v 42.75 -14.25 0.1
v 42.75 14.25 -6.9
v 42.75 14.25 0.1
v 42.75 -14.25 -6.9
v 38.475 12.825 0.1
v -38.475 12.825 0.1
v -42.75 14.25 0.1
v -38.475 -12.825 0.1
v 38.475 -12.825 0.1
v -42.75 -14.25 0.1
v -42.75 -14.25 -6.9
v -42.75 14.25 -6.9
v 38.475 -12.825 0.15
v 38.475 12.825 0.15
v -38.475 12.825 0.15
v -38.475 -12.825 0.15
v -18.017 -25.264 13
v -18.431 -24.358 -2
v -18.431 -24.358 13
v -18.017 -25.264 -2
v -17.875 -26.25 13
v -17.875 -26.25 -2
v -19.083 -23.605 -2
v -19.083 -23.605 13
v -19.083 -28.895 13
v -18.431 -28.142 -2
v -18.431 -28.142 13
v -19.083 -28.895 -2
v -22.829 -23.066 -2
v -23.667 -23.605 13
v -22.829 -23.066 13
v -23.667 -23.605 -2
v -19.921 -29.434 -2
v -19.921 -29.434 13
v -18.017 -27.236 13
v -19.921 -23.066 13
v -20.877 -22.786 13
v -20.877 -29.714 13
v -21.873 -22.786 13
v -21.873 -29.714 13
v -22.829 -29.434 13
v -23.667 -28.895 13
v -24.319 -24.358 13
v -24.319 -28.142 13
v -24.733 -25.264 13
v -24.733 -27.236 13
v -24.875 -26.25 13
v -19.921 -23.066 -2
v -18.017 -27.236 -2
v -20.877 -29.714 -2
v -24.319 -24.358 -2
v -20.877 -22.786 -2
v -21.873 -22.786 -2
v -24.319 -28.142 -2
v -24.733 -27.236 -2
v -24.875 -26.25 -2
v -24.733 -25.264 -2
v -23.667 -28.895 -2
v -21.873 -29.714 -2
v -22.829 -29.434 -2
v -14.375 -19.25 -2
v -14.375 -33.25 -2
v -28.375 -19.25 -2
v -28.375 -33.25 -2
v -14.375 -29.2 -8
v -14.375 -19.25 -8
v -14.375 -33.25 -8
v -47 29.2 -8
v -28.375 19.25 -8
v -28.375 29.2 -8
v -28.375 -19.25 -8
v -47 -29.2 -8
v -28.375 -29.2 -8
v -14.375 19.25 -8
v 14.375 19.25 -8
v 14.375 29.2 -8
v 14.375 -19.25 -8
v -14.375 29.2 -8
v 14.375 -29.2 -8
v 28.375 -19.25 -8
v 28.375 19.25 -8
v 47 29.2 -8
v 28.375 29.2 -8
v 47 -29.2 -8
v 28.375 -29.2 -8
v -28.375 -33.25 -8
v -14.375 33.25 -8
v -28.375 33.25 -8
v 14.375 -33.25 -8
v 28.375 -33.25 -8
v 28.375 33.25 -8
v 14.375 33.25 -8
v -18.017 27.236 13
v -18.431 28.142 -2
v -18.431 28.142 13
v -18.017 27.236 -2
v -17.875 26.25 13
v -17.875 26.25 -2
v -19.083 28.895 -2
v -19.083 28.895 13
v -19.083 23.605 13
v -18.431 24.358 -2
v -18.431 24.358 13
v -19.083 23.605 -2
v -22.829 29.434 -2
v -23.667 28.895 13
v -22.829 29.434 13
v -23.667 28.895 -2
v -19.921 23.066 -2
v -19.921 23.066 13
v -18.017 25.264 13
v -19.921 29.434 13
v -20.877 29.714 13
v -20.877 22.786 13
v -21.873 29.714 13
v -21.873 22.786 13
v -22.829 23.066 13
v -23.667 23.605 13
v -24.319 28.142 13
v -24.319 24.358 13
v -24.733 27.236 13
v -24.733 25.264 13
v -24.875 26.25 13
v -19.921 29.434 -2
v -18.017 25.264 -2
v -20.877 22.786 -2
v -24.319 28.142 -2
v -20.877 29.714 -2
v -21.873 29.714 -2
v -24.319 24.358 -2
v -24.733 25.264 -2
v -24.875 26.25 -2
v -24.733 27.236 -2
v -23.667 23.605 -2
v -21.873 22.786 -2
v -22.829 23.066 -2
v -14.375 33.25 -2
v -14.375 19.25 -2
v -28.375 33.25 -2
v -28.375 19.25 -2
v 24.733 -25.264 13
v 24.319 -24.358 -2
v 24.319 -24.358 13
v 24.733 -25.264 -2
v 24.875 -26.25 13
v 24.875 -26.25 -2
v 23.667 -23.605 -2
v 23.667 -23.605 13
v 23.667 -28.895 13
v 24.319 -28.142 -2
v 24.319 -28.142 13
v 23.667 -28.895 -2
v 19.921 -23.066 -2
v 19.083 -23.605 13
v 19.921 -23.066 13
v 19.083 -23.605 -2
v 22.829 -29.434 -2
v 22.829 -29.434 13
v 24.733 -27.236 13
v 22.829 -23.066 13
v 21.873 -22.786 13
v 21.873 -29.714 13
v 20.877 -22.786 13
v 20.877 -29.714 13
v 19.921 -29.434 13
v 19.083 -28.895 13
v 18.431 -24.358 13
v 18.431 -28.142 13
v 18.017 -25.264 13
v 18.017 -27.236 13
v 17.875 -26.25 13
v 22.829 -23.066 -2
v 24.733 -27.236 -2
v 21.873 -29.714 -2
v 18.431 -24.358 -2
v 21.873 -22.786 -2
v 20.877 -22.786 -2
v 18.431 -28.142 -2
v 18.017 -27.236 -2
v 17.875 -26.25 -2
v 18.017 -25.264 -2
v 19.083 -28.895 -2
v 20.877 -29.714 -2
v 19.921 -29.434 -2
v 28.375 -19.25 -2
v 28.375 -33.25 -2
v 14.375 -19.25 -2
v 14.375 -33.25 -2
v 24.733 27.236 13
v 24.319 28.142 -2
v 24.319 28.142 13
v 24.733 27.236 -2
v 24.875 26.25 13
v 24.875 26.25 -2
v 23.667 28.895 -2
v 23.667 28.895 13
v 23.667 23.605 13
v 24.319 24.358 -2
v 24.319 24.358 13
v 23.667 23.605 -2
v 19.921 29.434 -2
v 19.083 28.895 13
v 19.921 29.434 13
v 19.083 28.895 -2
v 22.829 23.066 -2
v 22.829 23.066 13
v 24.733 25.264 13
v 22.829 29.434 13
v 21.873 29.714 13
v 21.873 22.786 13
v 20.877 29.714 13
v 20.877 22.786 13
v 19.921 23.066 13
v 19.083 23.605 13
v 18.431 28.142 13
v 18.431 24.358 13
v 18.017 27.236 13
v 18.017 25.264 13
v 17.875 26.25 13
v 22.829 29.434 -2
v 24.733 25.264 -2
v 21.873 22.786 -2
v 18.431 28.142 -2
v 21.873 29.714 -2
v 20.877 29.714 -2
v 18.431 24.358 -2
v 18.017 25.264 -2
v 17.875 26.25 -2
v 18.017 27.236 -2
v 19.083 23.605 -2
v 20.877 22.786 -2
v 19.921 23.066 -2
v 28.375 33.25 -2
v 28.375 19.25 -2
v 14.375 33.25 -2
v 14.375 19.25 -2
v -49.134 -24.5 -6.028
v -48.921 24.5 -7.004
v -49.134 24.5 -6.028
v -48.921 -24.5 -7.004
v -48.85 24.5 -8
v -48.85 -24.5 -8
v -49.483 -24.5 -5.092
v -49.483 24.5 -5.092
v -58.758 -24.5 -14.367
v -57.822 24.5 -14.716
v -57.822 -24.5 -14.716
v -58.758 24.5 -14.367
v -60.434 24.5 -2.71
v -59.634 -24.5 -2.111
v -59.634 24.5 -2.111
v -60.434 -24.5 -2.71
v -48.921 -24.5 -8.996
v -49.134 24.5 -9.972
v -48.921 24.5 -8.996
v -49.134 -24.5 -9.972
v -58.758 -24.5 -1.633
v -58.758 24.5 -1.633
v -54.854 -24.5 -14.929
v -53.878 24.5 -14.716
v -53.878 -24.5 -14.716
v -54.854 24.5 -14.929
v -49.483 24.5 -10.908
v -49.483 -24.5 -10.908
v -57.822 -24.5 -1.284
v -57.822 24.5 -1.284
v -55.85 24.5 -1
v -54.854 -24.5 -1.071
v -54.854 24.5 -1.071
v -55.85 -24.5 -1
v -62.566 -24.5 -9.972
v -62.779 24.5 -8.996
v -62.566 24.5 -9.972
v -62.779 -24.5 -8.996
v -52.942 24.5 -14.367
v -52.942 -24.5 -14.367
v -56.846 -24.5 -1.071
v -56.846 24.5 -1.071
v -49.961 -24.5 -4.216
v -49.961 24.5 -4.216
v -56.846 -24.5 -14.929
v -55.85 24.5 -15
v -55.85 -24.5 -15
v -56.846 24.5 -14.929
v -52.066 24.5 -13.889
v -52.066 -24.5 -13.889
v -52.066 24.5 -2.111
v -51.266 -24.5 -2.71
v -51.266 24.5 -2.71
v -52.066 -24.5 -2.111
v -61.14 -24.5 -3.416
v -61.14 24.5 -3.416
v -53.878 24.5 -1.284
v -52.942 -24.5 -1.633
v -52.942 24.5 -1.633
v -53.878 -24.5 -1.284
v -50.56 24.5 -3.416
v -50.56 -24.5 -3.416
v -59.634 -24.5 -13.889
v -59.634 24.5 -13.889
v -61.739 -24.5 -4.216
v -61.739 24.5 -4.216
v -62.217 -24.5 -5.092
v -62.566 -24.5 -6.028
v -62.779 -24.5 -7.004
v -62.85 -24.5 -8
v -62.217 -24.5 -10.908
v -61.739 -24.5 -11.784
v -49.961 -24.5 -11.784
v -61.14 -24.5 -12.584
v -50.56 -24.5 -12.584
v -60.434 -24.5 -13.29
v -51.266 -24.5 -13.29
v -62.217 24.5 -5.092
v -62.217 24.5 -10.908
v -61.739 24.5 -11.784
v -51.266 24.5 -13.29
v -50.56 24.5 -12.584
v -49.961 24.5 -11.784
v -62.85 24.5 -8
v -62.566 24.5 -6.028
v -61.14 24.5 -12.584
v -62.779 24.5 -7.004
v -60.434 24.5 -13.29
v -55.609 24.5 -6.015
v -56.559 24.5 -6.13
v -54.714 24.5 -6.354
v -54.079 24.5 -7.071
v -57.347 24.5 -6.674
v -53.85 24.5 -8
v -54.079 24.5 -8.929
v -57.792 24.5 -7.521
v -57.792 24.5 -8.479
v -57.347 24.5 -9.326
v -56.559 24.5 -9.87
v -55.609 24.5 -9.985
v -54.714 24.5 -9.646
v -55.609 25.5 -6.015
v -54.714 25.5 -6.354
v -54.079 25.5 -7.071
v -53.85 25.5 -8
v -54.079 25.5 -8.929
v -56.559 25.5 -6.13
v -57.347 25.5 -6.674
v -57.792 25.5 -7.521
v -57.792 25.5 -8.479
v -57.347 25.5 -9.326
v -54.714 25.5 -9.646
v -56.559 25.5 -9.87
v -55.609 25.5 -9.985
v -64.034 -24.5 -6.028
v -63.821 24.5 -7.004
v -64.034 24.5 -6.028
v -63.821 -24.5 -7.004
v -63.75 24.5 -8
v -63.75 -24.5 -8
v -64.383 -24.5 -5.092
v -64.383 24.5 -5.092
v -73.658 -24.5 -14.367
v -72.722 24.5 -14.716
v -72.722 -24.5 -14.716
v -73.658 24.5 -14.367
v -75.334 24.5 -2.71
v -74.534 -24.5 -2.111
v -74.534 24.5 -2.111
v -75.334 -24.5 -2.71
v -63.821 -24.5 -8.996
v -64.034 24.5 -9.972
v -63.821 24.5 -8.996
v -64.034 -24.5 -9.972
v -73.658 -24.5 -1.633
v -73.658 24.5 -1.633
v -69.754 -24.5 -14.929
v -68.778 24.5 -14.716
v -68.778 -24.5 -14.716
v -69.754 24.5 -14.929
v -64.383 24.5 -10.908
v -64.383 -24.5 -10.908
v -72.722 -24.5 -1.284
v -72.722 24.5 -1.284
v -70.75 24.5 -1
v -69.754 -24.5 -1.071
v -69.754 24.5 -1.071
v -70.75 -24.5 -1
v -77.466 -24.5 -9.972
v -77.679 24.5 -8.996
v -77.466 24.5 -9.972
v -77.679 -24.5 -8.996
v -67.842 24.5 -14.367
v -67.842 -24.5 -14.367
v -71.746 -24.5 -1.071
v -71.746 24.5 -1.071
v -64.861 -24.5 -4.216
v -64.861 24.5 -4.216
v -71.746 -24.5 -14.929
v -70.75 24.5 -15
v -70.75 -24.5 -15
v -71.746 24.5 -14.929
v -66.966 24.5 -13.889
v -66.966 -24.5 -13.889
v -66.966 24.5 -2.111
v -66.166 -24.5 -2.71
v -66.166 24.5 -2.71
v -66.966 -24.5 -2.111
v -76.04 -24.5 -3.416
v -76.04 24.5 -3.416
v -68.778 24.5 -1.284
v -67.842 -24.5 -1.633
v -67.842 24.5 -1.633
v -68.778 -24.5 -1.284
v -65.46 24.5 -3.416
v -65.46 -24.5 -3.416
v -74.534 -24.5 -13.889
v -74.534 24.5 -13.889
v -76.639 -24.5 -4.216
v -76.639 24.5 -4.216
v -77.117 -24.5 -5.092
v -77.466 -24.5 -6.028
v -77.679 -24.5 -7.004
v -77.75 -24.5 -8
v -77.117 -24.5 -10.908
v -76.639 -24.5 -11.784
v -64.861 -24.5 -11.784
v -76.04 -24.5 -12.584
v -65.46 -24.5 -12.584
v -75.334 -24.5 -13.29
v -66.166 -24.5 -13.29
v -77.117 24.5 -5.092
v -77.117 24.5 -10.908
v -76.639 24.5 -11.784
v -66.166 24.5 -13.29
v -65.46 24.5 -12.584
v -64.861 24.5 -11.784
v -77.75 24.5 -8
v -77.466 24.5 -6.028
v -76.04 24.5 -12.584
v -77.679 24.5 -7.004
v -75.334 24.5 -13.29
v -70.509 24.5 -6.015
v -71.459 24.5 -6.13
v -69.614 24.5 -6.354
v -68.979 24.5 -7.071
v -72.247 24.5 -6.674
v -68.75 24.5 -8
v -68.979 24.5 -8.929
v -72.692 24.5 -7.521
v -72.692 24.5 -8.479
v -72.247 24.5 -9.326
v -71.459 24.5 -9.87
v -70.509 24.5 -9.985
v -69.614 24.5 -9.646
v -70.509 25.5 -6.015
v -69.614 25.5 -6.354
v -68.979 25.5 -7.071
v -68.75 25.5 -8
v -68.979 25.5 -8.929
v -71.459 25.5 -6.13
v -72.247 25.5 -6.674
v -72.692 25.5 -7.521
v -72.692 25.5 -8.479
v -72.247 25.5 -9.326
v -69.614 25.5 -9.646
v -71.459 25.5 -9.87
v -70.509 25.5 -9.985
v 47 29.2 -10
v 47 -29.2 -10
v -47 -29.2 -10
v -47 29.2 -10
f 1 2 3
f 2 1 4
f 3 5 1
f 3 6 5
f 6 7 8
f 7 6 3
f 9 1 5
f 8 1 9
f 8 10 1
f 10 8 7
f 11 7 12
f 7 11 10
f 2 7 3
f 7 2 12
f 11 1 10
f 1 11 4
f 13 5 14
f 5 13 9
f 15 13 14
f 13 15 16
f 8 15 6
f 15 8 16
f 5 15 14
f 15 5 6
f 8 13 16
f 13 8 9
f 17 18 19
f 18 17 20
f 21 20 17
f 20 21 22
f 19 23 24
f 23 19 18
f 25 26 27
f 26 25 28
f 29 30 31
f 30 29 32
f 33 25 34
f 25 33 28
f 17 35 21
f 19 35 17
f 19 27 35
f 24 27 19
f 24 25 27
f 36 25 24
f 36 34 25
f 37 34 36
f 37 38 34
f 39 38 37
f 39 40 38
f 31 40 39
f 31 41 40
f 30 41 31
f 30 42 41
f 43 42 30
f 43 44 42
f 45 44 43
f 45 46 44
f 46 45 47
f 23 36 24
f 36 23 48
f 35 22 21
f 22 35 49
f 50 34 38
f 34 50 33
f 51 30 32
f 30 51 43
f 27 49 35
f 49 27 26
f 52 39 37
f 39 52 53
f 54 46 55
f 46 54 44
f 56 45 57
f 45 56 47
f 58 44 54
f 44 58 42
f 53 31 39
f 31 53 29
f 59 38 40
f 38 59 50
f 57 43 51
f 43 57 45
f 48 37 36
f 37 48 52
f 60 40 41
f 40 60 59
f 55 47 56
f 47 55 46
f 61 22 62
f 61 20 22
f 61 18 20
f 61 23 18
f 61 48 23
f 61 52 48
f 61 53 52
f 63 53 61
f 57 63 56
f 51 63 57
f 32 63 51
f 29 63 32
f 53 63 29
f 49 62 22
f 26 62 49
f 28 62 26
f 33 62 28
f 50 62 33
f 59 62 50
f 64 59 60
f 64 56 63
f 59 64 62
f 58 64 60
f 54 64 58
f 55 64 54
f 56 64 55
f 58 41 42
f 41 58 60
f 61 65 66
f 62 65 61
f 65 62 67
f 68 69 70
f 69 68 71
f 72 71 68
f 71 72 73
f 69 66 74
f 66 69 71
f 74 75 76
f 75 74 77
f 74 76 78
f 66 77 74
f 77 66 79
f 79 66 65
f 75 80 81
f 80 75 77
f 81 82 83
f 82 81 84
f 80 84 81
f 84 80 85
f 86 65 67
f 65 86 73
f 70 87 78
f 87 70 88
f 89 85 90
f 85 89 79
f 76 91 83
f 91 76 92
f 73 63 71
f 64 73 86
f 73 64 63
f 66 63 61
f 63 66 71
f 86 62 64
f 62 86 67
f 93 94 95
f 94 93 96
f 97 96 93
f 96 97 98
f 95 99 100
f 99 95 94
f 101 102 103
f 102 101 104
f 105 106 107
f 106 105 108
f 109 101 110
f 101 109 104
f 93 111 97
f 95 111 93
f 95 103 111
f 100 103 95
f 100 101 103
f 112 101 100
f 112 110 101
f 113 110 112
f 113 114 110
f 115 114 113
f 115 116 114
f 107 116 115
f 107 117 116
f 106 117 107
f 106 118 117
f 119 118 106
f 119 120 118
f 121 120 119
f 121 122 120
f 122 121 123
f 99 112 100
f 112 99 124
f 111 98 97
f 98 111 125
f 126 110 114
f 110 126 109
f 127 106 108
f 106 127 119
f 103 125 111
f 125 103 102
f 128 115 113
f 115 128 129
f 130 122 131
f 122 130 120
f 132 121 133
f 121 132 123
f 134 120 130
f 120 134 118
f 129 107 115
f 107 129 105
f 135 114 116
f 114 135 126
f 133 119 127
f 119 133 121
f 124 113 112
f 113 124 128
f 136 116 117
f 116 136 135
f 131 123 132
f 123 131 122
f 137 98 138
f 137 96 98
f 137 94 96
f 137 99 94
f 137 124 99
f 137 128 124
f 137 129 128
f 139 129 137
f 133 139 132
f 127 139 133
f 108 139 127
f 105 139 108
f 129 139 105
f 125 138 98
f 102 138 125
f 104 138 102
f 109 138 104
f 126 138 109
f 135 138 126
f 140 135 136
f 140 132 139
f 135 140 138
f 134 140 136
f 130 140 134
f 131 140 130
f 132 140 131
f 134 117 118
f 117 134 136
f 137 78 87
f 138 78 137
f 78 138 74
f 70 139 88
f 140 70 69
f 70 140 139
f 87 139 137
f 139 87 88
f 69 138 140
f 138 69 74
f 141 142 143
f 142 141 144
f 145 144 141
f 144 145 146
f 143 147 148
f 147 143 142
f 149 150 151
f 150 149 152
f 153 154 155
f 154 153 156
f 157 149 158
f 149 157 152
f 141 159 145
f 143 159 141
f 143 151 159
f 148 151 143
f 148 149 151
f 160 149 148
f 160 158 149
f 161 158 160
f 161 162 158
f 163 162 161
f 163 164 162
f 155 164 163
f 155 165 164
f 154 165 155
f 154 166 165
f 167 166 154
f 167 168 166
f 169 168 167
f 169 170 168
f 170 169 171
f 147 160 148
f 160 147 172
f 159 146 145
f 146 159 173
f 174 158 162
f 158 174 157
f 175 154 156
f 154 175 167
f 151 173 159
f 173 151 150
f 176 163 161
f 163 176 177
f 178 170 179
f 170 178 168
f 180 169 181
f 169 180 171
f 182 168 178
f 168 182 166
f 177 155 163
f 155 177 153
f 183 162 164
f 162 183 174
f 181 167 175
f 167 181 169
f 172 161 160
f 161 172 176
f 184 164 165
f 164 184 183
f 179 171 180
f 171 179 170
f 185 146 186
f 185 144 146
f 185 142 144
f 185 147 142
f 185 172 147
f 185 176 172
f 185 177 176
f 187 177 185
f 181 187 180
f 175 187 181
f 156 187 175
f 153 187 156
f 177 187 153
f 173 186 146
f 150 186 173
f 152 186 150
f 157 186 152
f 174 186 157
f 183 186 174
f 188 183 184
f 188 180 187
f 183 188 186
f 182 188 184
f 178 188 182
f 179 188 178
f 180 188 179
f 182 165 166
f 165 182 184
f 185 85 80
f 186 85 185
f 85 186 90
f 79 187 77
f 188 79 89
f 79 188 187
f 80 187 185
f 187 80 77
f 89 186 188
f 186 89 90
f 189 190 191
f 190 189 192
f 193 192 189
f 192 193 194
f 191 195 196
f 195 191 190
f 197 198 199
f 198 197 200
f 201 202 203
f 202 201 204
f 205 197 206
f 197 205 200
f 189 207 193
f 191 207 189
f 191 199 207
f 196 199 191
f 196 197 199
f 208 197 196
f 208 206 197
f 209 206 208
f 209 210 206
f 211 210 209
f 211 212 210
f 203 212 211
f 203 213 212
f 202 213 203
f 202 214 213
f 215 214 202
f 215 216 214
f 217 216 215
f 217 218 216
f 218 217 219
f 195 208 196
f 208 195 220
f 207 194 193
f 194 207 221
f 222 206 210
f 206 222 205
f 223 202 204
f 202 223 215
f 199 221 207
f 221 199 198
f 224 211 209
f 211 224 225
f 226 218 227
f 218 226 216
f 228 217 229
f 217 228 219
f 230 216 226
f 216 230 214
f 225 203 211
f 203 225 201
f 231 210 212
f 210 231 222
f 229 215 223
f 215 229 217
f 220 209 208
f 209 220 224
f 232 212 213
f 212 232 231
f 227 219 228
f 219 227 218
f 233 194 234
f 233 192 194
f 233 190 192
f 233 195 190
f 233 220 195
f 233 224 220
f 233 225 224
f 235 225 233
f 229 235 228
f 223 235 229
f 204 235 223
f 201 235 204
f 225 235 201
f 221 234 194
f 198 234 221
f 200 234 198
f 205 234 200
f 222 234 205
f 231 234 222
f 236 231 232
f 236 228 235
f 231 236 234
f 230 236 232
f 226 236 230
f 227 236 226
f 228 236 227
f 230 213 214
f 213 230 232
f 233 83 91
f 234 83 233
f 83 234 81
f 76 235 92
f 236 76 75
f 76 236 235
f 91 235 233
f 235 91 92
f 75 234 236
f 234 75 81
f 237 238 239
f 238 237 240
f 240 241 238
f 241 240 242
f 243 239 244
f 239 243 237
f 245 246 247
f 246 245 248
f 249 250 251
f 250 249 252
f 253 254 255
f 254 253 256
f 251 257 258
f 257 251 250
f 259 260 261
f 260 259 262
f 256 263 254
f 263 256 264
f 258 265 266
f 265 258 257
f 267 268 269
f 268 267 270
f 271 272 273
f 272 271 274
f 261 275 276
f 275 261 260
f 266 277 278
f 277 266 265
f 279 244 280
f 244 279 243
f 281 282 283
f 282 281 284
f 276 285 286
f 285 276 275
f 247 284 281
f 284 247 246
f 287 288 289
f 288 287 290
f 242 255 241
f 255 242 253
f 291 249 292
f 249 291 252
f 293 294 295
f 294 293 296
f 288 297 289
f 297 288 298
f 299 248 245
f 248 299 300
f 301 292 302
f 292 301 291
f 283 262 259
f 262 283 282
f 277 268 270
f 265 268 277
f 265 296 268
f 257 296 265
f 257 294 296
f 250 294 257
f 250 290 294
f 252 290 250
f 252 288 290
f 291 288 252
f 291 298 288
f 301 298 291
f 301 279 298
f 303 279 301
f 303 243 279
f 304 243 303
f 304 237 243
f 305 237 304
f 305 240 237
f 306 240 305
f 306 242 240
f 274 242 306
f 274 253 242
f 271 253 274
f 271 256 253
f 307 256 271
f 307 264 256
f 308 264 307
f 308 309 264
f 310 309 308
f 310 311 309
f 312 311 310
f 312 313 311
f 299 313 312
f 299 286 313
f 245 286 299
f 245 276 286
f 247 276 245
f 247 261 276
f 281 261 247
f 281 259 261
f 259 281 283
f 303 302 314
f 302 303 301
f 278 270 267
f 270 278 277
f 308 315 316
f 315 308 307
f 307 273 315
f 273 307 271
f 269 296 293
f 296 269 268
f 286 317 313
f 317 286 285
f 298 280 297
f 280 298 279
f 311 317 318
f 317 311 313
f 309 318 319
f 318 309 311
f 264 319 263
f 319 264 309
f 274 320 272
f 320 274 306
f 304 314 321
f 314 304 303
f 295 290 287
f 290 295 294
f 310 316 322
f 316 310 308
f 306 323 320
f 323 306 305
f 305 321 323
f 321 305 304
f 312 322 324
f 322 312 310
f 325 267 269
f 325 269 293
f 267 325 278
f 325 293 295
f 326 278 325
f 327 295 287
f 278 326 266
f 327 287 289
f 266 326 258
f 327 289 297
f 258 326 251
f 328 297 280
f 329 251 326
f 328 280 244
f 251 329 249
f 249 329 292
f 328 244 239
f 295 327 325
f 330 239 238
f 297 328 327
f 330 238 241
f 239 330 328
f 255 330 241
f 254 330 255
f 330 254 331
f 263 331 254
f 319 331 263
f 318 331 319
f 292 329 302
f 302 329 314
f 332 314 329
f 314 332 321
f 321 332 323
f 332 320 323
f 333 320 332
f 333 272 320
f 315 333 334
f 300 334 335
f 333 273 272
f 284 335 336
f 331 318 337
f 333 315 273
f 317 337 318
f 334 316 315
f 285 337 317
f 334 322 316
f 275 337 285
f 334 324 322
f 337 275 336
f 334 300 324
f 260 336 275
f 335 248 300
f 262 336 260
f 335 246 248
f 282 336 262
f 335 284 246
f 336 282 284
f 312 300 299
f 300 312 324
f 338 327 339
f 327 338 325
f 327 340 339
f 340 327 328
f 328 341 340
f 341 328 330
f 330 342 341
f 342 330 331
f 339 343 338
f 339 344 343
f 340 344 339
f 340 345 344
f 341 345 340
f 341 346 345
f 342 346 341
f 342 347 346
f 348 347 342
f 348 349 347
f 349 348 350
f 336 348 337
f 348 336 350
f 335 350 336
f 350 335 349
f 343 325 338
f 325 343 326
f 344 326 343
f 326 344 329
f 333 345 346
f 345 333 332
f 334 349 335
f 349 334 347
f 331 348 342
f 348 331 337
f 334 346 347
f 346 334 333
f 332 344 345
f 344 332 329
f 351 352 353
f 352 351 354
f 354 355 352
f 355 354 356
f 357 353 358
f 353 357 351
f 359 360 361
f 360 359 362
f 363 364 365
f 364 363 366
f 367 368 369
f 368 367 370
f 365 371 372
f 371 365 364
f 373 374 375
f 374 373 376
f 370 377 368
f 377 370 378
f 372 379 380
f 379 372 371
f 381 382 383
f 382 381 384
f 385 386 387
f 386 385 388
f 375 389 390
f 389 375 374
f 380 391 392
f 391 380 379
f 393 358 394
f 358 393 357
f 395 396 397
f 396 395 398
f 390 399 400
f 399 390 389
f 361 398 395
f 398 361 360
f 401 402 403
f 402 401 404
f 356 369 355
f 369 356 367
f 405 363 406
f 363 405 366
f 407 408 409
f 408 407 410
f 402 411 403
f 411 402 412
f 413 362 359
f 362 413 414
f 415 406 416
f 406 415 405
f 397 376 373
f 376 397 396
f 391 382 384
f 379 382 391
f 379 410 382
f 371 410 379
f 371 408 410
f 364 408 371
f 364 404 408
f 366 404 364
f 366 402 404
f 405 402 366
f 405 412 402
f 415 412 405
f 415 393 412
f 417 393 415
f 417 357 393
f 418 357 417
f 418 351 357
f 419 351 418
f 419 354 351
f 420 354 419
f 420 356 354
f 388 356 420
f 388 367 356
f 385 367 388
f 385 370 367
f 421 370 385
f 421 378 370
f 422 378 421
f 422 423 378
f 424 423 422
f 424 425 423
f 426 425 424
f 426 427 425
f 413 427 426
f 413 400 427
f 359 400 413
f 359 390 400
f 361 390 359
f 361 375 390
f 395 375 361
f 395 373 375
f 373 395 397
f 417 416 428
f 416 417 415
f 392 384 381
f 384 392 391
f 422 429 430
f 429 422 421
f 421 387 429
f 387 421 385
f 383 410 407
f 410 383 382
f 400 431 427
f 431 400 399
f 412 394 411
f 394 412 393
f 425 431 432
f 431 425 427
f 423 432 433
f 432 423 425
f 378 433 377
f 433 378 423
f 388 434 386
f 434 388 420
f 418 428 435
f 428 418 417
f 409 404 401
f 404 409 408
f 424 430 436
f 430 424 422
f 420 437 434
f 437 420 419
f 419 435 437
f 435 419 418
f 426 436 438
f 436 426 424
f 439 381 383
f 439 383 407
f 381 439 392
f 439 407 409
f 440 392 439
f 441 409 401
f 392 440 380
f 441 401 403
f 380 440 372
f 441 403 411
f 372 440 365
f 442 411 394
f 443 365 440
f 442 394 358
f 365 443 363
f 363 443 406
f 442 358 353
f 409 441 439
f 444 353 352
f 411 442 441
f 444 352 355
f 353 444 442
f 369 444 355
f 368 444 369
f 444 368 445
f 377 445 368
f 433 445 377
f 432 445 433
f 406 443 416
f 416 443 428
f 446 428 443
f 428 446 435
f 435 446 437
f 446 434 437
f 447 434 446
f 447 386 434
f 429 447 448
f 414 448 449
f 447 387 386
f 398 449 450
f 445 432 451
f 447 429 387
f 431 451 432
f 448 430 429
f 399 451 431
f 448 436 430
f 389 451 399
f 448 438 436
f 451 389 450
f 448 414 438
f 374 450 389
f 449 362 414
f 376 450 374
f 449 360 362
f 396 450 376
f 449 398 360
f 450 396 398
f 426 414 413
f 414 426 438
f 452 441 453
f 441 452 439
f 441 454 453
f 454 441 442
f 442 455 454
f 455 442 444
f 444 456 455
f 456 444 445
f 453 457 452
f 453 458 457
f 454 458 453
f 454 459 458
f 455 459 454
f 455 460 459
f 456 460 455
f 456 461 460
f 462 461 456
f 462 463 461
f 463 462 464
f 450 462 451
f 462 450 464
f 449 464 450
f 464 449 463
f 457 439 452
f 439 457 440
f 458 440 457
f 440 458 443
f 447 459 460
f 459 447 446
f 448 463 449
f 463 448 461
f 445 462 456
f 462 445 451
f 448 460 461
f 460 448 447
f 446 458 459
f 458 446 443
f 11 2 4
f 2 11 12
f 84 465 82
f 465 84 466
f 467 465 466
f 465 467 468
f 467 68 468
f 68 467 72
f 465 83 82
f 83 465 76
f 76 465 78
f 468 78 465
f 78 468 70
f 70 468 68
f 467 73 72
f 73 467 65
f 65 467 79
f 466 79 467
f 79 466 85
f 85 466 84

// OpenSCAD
$fs=1;
$fa=1;


display_w=85.5;
display_h=28.5;

border=10;
w=display_w+2*10;
l=display_h+2*10+2*14;

mainboard_w=94;
mainboard_l=58.4;

wall=2;

// TODO bei dieser Höhe muss Akku / Mainboard neben den UI-Einheiten liegen?
h=15;

encoder_d=7;


module aa_cell()
{
	rotate(90,[1,0,0]) color([.3,.3,.7]){
		cylinder(h=49,r=14/2,center=true);
		translate([0,0,-49/2-1/2]) cylinder(h=1,r=2,center=true);
	}
}

module bevel_cube(size,bevel)
{
	hull()
	{
		cube(size-[0,bevel,bevel],center=true);
		cube(size-[bevel,bevel,0],center=true);
		cube(size-[bevel,0,bevel],center=true);
	}
}

module mainboard()
{
	color([.7,.3,0]) cube([mainboard_w,mainboard_l,2],center=true);
}

module knobs_and_display(inner_only)
{
	translate([0,0,-2.5+0.1-(inner_only ? wall : 0)]) {
		color([.4,.4,.4]) cube([display_w,display_h,5],center=true);
		if(!inner_only) color([.2,1.,.2]) translate([0,0,5/2]) cube([display_w*.9,display_h*.9,.1],center=true);
	}
	
	for(x=[-1,1])
	  for(y=[-1,1])
	    translate([x*display_w/4,y*(display_h/2+24/2),-wall])
		   color([.4,.4,.4]) union(){
				if(!inner_only) cylinder(r=encoder_d/2,h=15);
				translate([0,0,-3]) cube([14,14,6],center=true);
			}
}



module meld()
{
	hull() intersection() 
   {
		child(0);
		for (a = [1:$children-1]) child(a);
	}
	for (a = [1:$children-1]) child(a);
}


module inner_right()
{
   y=-8;
	cell_y=-0;
	translate([0,0,y-1]) mainboard();
	knobs_and_display(true);	
}


module inner_left()
{
   y=-8;
	cell_y=-0;
	translate([-w/2-3.1,0,y+cell_y]) aa_cell();
	translate([-w/2-18,0,y+cell_y]) aa_cell();
}


module inner_hull()
{
   y=-8;
	cell_y=-0;

   meld() {
		translate([-55,0,0]) cube([60,100,40],center=true);
		hull() inner_left();
		hull() inner_right();
	}
}

module inner()
{
	inner_left();
	inner_right();
}


knobs_and_display(false);

inner();

%difference()
{	
	minkowski()
	{
		bevel_cube([wall*2,wall*2,wall*2],wall);
		inner_hull();
	}
	minkowski() 
	{
		knobs_and_display(false);
		cube([.2,.2,.2],center=true);
	}
}
